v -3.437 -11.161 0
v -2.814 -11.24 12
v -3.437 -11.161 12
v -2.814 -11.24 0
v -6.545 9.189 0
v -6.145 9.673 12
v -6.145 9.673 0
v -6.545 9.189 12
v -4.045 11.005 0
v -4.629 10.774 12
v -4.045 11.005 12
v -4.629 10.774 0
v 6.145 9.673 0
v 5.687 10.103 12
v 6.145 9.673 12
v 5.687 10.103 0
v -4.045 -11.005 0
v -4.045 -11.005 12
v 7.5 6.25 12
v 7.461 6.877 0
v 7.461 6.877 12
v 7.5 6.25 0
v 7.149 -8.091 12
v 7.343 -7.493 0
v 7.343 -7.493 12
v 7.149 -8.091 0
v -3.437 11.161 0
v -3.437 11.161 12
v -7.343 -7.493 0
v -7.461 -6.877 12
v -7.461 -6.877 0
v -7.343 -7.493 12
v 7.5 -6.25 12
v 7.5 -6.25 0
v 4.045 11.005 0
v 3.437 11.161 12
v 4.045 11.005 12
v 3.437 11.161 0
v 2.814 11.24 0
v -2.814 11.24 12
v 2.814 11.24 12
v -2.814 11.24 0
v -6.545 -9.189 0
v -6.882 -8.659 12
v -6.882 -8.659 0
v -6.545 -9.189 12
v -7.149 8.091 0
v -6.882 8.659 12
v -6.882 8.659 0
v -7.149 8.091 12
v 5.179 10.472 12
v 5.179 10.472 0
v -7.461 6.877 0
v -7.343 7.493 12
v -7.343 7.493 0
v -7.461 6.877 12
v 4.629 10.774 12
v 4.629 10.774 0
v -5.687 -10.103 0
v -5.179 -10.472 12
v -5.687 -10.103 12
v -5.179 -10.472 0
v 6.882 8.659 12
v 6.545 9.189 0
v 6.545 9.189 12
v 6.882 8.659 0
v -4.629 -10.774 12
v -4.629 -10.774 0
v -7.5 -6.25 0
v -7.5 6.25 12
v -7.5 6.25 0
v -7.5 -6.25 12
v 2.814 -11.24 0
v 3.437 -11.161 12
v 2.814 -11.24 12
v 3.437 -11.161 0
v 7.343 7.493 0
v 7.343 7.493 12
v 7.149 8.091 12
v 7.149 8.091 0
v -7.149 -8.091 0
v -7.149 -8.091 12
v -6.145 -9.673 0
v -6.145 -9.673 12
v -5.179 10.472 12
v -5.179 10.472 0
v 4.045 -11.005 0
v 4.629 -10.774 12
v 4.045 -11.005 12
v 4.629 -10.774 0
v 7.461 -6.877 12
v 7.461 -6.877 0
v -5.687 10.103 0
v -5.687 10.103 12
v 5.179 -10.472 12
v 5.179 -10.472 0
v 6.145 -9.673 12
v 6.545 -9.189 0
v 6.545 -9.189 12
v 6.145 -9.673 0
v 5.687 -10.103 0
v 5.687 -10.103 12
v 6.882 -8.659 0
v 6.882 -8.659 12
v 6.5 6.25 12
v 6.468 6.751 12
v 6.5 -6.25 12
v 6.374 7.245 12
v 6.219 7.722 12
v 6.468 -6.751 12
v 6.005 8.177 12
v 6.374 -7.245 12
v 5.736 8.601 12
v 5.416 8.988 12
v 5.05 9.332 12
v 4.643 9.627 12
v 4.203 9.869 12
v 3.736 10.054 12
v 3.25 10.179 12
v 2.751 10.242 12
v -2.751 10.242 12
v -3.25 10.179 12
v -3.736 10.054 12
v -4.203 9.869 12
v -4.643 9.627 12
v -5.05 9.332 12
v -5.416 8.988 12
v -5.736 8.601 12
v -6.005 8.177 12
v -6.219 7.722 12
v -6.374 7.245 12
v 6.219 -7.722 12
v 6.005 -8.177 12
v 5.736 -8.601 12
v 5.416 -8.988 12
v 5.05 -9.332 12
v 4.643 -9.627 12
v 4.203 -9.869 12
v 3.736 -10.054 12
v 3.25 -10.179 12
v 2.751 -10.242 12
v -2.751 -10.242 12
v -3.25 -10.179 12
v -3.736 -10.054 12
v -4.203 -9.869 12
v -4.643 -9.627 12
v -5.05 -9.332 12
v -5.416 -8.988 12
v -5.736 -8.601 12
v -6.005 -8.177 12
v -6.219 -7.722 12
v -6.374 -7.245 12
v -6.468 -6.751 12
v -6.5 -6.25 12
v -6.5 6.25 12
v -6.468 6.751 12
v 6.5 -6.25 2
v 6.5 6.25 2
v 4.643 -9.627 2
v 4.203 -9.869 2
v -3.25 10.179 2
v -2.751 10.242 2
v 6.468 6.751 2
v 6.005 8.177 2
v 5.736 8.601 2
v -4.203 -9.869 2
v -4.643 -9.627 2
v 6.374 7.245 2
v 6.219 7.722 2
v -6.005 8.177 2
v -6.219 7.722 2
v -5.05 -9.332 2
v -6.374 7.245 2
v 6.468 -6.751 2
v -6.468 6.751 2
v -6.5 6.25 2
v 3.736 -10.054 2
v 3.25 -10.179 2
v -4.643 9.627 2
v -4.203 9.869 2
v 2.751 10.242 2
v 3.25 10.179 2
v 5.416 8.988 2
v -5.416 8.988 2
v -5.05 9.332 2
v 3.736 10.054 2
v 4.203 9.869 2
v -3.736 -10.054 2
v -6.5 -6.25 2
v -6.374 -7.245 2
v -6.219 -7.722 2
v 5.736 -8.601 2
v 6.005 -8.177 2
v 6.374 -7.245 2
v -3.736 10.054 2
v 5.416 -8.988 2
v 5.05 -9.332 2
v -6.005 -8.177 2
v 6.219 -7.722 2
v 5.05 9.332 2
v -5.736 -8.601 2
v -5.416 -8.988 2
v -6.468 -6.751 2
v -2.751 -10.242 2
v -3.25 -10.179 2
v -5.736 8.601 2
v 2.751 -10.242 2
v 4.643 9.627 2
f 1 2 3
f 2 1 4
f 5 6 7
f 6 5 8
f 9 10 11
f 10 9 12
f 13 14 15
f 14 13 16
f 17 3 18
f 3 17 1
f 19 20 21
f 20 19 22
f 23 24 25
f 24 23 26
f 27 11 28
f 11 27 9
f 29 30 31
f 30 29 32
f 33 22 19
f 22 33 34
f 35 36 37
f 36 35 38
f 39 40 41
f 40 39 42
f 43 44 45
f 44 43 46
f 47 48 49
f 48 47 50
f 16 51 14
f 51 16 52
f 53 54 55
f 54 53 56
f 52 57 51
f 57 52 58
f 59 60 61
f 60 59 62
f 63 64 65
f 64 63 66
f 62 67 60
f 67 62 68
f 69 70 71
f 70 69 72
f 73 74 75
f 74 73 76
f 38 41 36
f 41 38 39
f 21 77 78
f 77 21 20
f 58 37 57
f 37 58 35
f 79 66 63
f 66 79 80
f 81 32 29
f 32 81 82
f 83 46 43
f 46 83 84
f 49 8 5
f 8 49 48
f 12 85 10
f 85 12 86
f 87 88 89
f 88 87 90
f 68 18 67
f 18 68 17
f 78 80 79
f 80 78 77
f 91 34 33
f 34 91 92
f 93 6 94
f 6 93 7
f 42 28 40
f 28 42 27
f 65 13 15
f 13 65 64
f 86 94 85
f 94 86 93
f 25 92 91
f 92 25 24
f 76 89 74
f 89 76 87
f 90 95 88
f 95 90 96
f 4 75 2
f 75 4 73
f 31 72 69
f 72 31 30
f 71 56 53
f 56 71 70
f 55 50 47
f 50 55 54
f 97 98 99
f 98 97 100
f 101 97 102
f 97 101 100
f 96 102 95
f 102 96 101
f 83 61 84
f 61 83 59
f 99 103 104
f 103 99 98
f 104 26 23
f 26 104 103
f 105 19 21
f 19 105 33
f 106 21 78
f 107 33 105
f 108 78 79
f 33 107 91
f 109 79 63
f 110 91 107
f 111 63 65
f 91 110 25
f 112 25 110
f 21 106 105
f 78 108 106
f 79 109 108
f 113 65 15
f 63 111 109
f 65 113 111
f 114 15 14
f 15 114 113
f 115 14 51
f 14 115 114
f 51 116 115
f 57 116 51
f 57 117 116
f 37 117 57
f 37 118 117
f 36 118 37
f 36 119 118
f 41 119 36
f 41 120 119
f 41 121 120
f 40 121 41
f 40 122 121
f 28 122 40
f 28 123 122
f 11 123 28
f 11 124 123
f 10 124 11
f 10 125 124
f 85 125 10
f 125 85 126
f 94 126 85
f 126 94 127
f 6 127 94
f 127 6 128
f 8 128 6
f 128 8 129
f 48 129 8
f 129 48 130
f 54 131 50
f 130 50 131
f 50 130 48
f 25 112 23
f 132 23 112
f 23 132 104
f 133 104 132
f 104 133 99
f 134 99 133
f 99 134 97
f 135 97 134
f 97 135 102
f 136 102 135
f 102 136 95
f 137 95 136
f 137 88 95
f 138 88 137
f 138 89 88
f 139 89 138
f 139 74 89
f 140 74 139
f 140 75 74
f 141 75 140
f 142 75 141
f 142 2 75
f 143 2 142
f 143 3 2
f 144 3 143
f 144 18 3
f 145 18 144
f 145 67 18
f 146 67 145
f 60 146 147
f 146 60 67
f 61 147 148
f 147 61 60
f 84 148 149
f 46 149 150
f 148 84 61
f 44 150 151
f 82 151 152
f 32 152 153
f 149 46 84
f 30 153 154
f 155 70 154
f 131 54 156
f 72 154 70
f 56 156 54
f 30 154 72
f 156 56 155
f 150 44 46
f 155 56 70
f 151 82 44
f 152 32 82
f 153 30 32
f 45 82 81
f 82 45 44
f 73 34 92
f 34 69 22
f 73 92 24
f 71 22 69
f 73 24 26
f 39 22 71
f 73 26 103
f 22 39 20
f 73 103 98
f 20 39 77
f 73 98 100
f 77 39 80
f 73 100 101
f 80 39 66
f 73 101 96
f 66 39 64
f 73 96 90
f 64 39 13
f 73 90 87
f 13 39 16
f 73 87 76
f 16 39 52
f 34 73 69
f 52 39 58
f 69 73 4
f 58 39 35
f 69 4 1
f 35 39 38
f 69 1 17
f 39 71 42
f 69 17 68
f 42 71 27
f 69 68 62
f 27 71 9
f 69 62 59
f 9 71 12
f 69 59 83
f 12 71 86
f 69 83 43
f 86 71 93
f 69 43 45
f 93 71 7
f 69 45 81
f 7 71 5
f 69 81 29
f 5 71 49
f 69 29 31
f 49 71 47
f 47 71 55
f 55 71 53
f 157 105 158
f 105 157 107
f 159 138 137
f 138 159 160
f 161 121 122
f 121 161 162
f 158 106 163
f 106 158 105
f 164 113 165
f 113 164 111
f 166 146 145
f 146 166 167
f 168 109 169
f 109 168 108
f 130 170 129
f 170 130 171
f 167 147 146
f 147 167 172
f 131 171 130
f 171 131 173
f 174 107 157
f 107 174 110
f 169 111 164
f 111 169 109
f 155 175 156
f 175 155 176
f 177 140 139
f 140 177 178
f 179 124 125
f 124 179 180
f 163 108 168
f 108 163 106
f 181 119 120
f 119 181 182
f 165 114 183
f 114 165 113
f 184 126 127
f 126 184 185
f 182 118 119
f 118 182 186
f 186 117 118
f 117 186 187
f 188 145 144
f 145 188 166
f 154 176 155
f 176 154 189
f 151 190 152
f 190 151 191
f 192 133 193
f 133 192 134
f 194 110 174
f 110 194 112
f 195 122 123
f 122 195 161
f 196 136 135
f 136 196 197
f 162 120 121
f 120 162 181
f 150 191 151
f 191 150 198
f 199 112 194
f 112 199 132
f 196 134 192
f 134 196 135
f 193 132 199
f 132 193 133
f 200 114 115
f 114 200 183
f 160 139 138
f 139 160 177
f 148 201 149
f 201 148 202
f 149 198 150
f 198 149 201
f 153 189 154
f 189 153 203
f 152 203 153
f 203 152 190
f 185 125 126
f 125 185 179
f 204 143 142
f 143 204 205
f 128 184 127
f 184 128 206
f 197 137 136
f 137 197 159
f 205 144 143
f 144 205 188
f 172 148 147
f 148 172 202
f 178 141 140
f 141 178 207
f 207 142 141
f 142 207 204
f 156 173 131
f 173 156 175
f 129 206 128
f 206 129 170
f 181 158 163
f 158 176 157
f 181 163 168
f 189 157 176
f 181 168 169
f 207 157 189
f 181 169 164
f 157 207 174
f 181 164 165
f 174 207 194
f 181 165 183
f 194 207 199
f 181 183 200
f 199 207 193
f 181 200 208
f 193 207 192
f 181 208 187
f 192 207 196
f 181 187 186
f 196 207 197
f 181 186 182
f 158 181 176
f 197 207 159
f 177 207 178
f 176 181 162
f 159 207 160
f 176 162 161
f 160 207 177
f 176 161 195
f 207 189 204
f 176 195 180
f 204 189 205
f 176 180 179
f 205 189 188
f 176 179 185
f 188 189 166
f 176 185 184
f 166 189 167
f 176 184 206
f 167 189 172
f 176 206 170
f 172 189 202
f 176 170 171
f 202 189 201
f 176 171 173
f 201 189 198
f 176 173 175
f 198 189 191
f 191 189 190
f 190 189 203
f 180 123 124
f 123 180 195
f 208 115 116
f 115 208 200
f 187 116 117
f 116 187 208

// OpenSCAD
$fn = 50;


difference() {
	union() {
		hull() {
			translate(v = [-2.5000000000, 6.2500000000, 0]) {
				cylinder(h = 12, r = 5);
			}
			translate(v = [2.5000000000, 6.2500000000, 0]) {
				cylinder(h = 12, r = 5);
			}
			translate(v = [-2.5000000000, -6.2500000000, 0]) {
				cylinder(h = 12, r = 5);
			}
			translate(v = [2.5000000000, -6.2500000000, 0]) {
				cylinder(h = 12, r = 5);
			}
		}
	}
	union() {
		translate(v = [0, 0, 2]) {
			hull() {
				translate(v = [-2.5000000000, 6.2500000000, 0]) {
					cylinder(h = 10, r = 4);
				}
				translate(v = [2.5000000000, 6.2500000000, 0]) {
					cylinder(h = 10, r = 4);
				}
				translate(v = [-2.5000000000, -6.2500000000, 0]) {
					cylinder(h = 10, r = 4);
				}
				translate(v = [2.5000000000, -6.2500000000, 0]) {
					cylinder(h = 10, r = 4);
				}
			}
		}
	}
}
